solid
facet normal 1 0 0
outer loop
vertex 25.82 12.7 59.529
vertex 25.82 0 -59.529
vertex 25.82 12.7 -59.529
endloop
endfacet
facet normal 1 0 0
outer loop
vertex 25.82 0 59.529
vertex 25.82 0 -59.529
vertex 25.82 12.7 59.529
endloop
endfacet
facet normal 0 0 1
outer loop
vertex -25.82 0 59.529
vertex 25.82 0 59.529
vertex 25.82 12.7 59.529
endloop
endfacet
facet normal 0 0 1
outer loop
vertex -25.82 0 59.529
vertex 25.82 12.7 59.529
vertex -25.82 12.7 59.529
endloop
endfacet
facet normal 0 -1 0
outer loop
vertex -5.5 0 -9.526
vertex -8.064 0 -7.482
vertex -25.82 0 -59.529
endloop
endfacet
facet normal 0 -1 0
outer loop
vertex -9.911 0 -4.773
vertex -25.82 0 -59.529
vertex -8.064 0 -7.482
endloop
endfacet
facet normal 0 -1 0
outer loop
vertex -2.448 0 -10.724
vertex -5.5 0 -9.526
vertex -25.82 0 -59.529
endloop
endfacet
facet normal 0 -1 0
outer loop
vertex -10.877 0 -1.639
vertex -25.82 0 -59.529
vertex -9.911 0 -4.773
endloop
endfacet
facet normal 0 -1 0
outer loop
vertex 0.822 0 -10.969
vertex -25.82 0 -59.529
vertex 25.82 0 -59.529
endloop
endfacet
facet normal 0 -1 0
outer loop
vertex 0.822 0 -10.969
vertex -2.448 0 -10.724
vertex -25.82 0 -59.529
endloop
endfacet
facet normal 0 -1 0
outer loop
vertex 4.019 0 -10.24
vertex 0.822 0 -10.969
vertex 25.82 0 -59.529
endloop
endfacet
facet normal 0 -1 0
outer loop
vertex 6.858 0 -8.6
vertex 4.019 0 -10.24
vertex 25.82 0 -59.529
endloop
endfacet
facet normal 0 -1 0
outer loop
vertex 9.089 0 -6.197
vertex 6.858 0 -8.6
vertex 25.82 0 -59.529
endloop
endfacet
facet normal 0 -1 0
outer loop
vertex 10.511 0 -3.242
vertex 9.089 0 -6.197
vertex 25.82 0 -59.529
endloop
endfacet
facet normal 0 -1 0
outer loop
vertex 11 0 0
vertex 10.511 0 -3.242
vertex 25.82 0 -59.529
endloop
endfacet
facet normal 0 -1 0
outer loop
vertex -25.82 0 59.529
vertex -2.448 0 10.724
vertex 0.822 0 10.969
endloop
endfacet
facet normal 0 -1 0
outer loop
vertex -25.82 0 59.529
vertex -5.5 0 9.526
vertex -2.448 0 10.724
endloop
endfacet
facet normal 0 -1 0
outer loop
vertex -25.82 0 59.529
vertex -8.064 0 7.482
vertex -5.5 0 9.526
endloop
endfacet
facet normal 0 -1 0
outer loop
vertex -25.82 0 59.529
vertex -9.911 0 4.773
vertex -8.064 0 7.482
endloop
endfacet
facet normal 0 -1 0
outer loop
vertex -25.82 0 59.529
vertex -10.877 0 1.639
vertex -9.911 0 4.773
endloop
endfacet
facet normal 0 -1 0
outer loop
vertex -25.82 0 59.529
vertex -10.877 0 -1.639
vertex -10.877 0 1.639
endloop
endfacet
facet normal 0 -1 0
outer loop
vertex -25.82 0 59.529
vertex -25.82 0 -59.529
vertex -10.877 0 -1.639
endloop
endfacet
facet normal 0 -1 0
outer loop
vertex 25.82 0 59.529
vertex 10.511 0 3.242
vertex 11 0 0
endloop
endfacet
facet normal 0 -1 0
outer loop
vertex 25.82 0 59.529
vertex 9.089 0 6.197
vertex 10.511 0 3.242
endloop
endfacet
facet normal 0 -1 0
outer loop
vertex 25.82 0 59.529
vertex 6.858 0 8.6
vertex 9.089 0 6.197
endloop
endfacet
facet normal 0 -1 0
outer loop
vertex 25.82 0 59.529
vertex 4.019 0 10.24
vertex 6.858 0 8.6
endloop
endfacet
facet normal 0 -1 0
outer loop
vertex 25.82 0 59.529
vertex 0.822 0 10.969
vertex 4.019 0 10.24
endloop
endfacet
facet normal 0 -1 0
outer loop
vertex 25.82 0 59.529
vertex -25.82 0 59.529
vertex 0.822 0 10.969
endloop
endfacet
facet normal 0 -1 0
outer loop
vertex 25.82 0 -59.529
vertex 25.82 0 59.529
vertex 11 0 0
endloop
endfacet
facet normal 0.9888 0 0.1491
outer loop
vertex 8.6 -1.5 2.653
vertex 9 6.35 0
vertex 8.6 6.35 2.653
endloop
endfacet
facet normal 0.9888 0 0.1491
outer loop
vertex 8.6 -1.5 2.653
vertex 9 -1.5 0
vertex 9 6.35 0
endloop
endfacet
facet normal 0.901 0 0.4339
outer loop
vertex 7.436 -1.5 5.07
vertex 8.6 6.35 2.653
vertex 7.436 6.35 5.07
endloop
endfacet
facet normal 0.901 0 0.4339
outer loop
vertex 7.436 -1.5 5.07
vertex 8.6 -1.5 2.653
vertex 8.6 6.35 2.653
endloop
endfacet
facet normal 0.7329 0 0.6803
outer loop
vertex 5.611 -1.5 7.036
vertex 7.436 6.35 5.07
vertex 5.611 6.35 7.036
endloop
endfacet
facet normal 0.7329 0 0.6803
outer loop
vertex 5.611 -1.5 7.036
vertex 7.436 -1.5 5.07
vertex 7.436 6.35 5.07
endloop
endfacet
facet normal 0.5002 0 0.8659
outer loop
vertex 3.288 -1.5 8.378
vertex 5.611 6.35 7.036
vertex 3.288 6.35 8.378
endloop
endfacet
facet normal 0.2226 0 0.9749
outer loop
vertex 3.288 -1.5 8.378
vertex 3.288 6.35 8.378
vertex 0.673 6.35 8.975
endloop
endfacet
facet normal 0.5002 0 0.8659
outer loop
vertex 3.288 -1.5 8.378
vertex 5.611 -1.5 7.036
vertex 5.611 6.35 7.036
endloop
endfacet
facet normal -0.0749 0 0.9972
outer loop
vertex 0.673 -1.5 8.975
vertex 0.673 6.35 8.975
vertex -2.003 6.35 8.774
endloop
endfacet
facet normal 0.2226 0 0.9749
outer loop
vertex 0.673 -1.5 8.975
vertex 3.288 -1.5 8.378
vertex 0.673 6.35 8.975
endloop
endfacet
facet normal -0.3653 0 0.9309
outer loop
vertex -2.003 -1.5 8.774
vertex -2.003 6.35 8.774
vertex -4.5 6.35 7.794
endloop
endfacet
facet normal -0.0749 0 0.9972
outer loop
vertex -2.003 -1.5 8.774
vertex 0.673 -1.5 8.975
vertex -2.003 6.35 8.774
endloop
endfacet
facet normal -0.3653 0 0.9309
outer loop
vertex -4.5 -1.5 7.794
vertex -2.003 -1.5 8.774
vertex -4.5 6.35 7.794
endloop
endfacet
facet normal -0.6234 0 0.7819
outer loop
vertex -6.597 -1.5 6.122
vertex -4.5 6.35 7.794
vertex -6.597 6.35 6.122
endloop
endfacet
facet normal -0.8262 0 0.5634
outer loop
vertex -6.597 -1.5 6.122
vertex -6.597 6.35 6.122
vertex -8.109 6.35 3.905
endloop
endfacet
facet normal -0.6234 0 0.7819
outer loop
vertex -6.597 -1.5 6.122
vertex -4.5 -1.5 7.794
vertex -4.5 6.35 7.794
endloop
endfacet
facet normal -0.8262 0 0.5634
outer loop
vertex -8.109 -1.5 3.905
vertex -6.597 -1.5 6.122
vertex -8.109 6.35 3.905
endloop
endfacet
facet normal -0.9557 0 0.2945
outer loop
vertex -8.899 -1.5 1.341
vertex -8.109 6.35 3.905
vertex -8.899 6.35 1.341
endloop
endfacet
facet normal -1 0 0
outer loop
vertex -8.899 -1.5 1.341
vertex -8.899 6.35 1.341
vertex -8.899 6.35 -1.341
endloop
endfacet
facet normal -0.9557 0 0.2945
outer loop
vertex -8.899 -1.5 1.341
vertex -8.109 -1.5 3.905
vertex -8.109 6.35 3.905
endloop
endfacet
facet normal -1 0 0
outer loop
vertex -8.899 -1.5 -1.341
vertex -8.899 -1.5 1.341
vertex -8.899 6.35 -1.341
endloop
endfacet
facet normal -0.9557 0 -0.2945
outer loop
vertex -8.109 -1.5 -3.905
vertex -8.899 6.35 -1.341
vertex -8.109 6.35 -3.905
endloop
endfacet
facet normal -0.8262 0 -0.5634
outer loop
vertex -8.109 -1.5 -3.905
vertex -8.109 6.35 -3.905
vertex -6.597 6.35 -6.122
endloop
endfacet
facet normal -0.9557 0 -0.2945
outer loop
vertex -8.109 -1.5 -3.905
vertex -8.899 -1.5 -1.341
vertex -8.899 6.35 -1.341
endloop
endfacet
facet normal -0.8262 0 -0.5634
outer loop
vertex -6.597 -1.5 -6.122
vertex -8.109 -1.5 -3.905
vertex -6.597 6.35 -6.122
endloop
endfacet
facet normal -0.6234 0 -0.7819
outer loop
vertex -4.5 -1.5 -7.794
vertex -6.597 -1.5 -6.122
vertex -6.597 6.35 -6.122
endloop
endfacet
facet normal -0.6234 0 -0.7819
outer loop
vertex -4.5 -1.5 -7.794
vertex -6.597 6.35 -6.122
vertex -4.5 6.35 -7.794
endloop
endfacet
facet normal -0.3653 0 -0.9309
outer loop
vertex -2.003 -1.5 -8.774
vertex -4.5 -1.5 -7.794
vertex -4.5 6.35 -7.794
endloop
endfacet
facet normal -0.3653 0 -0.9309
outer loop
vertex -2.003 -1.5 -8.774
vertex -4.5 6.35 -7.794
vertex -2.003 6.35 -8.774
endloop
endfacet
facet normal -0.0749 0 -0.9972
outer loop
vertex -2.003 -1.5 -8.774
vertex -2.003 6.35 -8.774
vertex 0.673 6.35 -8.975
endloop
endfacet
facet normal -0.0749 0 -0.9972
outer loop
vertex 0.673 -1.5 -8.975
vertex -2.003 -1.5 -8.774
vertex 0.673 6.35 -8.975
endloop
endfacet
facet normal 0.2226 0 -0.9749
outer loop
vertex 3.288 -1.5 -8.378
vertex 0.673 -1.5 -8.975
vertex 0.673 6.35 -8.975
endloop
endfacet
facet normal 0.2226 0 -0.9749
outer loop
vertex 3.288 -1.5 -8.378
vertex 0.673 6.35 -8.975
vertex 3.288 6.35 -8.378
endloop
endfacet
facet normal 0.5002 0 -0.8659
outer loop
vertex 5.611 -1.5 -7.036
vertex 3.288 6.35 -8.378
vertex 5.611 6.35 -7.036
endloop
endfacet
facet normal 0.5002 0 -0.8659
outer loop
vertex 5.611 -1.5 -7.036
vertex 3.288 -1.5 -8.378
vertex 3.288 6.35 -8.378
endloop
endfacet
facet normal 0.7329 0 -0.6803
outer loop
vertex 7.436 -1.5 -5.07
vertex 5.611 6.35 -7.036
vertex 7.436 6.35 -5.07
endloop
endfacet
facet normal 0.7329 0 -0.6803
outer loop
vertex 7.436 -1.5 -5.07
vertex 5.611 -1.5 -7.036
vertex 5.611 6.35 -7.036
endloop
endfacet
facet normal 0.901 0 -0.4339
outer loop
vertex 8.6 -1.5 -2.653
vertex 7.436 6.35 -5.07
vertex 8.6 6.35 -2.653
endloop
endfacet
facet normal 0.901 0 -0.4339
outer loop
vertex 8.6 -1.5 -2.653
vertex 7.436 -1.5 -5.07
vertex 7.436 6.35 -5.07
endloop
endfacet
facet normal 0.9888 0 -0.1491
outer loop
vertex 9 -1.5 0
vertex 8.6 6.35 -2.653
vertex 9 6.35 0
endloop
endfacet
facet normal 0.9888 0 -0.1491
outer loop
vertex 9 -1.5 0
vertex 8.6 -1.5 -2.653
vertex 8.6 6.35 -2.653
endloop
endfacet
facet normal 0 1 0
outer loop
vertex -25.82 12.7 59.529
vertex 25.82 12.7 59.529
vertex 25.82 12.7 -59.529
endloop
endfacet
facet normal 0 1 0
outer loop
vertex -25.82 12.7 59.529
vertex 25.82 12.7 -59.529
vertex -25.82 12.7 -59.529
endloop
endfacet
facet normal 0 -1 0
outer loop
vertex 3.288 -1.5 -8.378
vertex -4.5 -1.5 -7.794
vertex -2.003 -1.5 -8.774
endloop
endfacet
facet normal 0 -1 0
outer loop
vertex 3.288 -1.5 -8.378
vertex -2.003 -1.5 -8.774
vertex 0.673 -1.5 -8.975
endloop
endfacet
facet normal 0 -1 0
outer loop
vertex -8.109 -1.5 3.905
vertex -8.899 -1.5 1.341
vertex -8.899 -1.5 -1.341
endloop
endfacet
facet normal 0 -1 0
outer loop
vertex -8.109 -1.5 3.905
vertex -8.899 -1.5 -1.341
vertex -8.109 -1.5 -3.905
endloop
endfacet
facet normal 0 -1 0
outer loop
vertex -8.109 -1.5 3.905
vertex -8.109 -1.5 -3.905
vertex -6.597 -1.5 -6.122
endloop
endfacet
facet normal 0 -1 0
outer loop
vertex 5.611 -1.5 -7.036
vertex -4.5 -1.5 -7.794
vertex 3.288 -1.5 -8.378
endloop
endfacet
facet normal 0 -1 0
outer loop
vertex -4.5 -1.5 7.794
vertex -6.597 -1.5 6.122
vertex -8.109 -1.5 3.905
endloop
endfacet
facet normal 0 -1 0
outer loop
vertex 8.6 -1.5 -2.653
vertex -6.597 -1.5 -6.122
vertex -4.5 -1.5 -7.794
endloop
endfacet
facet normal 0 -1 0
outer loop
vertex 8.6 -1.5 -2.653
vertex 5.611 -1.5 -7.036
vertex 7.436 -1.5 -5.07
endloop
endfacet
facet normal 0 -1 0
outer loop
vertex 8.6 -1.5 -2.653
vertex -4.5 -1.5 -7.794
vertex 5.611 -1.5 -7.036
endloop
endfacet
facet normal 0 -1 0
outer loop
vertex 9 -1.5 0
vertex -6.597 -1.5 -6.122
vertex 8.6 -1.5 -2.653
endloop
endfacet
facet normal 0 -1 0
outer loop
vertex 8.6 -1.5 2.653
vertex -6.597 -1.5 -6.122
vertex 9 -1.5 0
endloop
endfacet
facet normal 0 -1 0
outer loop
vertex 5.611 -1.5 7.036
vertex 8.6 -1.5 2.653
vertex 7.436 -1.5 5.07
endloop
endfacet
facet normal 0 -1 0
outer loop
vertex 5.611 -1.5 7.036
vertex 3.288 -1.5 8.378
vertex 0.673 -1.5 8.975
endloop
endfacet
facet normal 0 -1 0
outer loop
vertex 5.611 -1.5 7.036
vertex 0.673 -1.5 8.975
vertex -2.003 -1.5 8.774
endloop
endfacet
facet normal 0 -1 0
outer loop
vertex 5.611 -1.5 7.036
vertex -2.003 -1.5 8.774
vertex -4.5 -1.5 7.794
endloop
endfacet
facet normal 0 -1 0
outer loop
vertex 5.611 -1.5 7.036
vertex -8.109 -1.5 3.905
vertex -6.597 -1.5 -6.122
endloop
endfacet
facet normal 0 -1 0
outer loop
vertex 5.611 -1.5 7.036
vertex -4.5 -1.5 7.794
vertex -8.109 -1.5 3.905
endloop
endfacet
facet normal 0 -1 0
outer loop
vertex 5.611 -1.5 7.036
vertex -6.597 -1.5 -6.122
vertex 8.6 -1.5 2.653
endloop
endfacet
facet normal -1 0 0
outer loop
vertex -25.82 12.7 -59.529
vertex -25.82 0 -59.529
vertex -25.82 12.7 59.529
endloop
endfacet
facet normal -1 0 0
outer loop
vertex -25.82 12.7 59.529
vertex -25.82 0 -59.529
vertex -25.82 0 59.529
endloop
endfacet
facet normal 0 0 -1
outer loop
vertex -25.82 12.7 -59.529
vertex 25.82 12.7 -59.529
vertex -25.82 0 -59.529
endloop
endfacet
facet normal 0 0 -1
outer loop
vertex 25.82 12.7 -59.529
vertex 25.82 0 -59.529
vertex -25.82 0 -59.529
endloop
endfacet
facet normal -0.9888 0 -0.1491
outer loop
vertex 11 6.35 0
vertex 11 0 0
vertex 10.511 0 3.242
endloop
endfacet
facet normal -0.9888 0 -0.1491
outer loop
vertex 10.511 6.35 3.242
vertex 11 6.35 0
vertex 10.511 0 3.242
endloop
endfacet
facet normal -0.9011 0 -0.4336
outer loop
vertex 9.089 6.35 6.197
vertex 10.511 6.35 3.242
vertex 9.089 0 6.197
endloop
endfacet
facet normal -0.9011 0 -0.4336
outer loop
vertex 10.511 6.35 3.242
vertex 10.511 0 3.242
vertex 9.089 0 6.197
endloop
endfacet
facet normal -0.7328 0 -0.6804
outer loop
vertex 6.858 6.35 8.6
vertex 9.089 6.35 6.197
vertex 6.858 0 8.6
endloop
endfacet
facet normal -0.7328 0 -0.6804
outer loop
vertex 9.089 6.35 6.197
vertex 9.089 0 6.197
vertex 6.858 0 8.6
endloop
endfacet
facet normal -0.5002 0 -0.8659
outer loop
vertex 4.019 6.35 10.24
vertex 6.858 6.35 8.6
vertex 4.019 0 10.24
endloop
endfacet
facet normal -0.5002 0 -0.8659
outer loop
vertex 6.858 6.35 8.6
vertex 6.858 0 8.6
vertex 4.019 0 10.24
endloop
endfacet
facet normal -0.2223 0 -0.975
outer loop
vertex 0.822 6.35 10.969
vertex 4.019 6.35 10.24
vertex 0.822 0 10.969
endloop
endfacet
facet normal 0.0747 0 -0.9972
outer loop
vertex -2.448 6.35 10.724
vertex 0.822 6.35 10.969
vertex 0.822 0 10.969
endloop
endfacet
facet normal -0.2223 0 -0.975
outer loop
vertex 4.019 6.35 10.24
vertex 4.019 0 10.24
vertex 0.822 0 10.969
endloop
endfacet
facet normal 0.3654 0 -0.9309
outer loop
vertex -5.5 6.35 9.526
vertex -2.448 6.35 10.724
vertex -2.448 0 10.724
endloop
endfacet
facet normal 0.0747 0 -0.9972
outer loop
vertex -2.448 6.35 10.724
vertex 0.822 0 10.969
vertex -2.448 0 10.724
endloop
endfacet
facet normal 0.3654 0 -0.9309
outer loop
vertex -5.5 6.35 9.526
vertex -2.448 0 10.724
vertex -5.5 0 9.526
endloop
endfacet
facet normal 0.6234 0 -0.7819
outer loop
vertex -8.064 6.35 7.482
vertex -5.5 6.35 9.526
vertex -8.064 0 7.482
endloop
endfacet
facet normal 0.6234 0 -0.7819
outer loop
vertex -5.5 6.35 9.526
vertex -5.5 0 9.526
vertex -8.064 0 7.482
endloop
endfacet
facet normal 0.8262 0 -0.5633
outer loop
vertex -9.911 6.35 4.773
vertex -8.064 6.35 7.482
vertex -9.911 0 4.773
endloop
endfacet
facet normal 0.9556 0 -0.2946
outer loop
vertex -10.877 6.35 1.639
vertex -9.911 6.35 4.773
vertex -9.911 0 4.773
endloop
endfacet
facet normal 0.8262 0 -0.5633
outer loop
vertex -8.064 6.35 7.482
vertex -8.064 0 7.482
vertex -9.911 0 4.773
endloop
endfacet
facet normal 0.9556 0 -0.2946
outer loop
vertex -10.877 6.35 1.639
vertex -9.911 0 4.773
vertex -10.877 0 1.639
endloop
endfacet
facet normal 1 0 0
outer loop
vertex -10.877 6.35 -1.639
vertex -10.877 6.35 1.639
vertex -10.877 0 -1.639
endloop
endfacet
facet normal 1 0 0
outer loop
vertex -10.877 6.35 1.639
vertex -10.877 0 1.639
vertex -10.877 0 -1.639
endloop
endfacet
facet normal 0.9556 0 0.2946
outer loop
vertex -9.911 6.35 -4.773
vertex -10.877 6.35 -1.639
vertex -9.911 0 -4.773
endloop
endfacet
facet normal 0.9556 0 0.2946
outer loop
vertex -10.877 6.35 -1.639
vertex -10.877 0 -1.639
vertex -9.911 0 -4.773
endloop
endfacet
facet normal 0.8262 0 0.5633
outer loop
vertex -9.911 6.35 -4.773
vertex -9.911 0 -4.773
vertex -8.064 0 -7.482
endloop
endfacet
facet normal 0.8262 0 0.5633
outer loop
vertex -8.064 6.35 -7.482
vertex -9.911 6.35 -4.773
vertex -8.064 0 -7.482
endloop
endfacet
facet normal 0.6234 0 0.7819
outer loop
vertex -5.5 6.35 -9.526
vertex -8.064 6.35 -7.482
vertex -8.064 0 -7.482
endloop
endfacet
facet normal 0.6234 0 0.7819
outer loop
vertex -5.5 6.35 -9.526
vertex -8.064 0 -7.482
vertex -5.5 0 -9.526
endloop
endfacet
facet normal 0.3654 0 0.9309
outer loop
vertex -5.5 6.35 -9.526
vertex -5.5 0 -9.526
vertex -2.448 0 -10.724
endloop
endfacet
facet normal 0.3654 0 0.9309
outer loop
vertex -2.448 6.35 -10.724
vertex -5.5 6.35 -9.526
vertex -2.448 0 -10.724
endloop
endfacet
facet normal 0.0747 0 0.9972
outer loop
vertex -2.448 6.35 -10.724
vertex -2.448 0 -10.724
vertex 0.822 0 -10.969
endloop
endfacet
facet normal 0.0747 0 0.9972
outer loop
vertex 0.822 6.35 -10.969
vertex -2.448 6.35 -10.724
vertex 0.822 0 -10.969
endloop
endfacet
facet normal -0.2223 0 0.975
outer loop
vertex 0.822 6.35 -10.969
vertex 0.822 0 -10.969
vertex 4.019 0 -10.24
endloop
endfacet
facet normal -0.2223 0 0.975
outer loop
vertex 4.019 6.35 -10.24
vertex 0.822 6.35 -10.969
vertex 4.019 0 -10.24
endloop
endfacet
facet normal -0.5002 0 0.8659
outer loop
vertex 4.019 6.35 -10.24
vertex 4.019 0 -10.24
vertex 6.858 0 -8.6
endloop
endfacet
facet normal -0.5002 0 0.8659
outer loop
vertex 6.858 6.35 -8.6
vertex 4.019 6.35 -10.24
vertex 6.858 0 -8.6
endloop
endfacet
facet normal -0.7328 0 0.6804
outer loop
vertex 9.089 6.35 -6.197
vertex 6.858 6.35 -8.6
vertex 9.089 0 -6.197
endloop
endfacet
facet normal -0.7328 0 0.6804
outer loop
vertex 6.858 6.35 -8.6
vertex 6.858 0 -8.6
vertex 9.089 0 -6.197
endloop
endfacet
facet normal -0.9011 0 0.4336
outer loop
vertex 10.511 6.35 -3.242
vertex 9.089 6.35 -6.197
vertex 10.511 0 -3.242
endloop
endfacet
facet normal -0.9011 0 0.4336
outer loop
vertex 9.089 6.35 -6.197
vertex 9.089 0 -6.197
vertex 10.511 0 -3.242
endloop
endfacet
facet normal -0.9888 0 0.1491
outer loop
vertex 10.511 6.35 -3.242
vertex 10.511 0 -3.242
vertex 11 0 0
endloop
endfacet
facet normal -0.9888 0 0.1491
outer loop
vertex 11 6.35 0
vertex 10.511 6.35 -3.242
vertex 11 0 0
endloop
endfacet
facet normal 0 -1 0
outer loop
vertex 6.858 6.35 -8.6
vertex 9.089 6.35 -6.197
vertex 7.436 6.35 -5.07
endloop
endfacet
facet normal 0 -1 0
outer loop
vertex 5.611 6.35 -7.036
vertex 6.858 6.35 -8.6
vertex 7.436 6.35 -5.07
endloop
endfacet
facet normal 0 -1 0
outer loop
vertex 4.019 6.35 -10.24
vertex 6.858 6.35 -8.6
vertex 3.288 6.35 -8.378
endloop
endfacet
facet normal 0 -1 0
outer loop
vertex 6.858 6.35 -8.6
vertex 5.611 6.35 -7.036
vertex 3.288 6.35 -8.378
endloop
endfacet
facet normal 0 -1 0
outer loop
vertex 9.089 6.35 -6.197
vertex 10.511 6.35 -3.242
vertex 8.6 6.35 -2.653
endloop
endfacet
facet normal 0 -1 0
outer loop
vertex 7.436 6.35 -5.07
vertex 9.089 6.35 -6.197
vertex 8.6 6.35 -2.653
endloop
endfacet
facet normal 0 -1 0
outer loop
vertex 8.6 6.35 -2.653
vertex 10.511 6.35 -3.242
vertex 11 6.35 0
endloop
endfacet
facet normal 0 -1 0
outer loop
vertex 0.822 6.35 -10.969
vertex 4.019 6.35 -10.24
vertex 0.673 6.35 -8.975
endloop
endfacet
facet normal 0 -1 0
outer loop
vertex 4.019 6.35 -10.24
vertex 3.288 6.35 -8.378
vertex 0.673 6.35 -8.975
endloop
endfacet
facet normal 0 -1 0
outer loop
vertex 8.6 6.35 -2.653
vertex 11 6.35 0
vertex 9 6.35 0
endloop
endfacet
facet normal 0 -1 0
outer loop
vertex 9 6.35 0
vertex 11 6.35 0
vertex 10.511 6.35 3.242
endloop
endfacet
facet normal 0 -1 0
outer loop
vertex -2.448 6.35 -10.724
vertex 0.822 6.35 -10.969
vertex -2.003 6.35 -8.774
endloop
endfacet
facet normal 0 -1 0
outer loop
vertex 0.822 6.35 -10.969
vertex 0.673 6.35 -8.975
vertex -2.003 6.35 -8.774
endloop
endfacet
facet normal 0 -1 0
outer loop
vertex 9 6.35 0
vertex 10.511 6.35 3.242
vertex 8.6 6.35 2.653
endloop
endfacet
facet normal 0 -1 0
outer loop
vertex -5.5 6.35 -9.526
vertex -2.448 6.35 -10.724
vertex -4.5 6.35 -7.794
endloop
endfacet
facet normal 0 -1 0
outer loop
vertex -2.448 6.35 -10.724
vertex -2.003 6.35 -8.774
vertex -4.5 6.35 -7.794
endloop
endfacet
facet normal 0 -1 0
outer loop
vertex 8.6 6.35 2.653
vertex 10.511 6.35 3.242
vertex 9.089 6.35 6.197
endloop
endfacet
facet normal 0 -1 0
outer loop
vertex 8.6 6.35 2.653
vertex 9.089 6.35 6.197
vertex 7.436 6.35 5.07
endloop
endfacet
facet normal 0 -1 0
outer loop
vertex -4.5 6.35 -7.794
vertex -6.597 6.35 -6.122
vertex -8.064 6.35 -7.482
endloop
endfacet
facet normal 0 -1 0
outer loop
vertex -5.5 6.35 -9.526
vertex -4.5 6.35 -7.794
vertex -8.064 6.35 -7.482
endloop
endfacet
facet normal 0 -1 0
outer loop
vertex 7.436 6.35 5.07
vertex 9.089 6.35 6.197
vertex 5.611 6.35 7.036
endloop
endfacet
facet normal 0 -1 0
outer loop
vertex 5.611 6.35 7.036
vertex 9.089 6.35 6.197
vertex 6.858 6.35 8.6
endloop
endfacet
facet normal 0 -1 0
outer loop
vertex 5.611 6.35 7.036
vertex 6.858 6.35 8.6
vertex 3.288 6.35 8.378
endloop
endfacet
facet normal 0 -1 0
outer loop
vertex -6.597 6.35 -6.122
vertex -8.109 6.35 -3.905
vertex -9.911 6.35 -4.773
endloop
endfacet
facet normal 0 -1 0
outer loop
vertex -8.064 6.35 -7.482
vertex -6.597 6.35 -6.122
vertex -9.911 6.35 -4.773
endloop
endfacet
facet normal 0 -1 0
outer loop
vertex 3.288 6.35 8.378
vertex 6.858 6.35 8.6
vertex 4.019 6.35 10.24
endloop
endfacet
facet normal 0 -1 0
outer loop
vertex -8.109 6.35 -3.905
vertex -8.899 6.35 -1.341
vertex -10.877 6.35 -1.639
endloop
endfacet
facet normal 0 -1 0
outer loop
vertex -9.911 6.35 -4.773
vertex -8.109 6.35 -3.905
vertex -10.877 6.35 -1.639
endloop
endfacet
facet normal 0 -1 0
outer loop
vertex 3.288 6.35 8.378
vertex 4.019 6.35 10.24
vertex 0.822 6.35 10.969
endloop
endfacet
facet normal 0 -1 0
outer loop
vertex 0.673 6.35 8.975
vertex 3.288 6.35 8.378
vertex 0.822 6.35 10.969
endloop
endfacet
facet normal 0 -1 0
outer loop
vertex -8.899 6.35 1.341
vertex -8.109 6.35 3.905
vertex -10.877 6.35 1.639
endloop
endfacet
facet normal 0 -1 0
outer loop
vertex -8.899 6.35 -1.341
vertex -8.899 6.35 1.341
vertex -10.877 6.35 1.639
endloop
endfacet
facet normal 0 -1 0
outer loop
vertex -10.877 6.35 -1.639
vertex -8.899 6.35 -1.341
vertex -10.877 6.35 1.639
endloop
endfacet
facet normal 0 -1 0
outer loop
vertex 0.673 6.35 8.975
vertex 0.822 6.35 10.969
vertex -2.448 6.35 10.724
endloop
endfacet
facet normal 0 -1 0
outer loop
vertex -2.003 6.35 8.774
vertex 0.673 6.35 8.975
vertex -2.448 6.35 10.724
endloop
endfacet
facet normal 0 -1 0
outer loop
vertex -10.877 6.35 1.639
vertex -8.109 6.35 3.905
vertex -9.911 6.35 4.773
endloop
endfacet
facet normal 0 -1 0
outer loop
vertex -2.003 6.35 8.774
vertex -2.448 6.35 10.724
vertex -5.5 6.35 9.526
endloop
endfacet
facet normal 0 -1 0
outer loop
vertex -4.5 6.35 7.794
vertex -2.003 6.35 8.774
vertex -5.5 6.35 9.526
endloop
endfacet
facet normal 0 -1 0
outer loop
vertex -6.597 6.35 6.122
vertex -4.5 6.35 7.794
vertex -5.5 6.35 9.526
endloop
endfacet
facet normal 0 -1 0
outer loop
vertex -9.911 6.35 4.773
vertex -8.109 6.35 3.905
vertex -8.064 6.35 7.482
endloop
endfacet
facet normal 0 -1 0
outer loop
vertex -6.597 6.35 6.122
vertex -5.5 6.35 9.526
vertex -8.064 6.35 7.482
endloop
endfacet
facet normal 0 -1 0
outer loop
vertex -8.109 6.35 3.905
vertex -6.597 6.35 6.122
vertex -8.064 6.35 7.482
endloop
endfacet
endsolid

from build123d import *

# Parameters (mm, degrees)
F0_R          = 9
F1_DEPTH      = 10
F1_DEPTH_BACK = 1.5
F2_W          = 51.6399771267
F2_H          = 119.0588462234
F2_R          = 11
F3_DEPTH      = 6.35
F4_W          = 51.6399771267
F4_H          = 119.0588462234
F5_DEPTH      = 6.35


with BuildPart() as f1:
    # F0 (on Front) → F1 (new body, two sides)
    with BuildSketch(Plane.XZ) as f1_sk:
        Circle(F0_R)
    extrude(amount=-F1_DEPTH)
    extrude(f1_sk.sketch, amount=F1_DEPTH_BACK)



with BuildPart() as f3:
    # F2 (on Front) → F3 (new body)
    with BuildSketch(Plane.XZ):
        Rectangle(F2_W, F2_H)
        Circle(F2_R, mode=Mode.SUBTRACT)
    extrude(amount=-F3_DEPTH)


with BuildPart() as f1_1:
    add(f1.part)

    add(f3.part)  # F5 merges F3
    # F4 (on face) → F5 (join)
    with BuildSketch(Plane(origin=(0, 6.35, 0), x_dir=(-1, 0, 0), z_dir=(0, 1, 0))):
        Rectangle(F4_W, F4_H)
    extrude(amount=F5_DEPTH)


solid = f1_1.part
